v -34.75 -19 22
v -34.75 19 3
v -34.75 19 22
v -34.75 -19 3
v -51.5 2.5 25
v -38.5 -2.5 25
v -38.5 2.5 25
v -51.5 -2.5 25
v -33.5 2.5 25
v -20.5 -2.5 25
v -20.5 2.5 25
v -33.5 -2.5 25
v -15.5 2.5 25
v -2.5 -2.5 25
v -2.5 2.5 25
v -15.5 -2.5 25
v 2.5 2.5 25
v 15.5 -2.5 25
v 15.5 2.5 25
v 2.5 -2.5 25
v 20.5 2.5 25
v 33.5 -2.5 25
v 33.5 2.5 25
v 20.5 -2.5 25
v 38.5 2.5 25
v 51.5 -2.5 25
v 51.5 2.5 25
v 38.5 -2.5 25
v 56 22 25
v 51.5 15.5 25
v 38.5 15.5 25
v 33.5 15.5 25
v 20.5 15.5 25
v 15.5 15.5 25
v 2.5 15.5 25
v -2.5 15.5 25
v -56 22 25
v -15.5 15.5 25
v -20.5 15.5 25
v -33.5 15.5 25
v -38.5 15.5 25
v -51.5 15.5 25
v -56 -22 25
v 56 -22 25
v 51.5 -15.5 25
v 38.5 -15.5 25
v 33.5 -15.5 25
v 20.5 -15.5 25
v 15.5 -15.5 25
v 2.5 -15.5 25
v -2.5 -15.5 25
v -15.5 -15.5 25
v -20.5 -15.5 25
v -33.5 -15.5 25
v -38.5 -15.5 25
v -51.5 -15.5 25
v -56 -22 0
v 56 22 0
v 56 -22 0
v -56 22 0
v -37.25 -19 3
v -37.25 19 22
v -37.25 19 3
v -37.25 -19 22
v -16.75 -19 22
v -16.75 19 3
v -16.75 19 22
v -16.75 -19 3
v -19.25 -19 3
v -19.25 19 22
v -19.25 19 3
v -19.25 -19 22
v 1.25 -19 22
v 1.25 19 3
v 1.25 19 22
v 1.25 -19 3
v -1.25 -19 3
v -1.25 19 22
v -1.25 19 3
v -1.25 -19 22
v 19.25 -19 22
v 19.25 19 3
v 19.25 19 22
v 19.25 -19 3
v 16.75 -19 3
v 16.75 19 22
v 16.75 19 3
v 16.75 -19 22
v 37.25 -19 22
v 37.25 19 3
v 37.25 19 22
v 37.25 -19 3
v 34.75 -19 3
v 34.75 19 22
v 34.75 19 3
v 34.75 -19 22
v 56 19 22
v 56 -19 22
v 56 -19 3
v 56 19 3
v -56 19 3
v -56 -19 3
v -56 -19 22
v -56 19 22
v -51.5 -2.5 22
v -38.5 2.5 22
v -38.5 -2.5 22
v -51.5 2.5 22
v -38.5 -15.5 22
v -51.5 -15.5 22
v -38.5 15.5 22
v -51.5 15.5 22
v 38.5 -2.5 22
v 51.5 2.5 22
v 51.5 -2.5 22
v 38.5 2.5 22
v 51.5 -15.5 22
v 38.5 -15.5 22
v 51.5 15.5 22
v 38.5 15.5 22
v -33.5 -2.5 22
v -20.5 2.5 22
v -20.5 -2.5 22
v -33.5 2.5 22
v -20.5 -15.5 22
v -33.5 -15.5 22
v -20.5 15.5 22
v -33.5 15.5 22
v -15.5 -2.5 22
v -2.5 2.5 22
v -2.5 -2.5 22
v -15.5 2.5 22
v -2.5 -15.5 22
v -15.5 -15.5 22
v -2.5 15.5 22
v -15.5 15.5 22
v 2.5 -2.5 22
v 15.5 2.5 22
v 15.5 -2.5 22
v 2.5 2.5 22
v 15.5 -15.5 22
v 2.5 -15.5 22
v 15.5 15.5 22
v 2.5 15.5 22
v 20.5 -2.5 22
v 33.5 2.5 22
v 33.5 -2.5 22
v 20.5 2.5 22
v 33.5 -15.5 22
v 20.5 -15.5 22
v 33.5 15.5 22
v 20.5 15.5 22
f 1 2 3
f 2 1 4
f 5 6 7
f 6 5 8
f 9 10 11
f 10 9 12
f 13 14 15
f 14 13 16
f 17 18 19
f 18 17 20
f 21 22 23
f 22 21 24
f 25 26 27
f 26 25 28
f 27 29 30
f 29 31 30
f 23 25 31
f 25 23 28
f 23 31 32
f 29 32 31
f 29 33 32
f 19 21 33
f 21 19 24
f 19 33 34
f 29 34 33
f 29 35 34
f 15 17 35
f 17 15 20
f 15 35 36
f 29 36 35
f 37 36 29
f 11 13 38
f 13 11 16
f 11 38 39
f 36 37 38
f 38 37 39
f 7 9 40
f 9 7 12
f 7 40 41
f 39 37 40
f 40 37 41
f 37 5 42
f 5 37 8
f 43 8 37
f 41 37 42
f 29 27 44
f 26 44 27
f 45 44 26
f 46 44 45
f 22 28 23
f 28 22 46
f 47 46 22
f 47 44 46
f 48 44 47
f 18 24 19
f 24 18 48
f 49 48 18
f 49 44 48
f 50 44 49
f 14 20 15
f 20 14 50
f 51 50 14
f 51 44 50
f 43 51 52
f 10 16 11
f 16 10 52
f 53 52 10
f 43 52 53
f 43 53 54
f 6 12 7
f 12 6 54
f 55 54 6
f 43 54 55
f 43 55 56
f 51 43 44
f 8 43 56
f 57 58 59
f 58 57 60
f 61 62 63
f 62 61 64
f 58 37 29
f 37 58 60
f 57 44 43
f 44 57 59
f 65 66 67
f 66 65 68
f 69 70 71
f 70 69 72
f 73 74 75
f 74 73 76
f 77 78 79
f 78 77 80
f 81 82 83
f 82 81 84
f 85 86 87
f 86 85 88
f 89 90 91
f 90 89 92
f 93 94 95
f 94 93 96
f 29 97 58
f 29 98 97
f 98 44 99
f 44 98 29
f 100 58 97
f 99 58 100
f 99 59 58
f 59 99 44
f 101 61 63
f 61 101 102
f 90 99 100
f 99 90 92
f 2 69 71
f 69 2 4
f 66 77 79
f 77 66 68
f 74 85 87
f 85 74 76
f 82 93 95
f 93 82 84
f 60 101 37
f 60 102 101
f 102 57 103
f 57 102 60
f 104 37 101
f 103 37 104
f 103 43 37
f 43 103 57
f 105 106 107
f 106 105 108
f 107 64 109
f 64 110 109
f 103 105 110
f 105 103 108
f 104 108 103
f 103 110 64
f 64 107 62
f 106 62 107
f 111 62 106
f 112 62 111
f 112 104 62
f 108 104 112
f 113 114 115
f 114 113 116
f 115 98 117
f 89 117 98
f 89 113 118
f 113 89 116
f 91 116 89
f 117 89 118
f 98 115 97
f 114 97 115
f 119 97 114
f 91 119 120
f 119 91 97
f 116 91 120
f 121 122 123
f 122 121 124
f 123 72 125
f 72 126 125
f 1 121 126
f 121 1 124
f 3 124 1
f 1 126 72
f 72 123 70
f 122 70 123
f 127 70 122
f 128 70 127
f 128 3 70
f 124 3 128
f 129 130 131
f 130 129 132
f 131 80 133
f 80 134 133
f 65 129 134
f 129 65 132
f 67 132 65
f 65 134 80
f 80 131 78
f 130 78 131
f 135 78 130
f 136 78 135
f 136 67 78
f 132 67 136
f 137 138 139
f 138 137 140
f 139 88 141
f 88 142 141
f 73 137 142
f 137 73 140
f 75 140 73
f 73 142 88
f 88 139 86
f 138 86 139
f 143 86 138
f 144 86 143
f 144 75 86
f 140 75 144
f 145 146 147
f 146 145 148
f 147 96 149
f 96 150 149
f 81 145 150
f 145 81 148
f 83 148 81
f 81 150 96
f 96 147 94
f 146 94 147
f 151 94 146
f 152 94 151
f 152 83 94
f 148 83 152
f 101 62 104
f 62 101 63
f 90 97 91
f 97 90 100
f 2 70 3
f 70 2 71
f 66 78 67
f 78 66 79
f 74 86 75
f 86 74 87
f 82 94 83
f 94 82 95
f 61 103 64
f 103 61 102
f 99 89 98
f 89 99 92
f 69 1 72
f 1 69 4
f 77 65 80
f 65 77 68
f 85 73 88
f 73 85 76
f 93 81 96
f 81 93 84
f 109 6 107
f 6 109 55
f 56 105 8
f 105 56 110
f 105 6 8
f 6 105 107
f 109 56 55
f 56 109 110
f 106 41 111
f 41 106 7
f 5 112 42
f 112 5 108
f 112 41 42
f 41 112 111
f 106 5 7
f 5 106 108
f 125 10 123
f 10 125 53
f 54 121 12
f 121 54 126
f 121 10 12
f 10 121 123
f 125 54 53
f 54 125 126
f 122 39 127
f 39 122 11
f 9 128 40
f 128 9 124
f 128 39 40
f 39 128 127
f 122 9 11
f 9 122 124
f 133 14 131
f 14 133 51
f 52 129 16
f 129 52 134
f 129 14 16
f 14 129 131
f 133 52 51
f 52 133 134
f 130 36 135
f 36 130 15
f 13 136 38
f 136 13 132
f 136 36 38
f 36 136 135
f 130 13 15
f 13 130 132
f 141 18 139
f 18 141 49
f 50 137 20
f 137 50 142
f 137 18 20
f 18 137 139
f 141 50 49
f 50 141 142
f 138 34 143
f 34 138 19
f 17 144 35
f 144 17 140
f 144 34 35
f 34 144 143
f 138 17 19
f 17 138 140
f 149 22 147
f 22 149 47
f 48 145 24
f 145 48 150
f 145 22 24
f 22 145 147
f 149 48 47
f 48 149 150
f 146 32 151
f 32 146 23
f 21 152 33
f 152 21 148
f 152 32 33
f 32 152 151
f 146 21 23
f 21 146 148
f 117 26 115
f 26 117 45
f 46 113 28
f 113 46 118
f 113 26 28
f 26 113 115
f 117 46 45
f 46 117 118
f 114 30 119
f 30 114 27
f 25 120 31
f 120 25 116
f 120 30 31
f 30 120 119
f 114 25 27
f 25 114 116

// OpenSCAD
// Cuvette Rack - 12 slots (2 rows × 6 columns)
// Dimensions in millimeters

// Base and deck dimensions
base_x = 112;           // Base plate width (X)
base_y = 44;            // Base plate depth (Y)
base_z = 3;             // Base plate thickness
deck_z = 3;             // Deck plate thickness
deck_bottom_z = 22;     // Deck bottom position (z)
deck_top_z = 25;        // Deck top position (z)

// Wall dimensions
wall_height = 25;       // Height from bottom to top
end_wall_thick = 3;     // Thickness of end walls (Y direction)
rib_thick = 2.5;        // Thickness of ribs (X direction)

// Rib positions (X coordinates)
rib_x_positions = [-36, -18, 0, 18, 36];

// Hole dimensions and spacing
hole_size = 13;         // Square hole side length (mm)
hole_spacing_x = 18;    // X spacing between hole centers
hole_spacing_y = 18;    // Y spacing between hole centers

// Set resolution for shapes
$fn = 64;

difference() {
    // Positive geometry: base, deck, and walls
    union() {
        // Base plate (z = 0 to 3)
        translate([-base_x/2, -base_y/2, 0])
            cube([base_x, base_y, base_z]);
        
        // Deck plate (z = 22 to 25)
        translate([-base_x/2, -base_y/2, deck_bottom_z])
            cube([base_x, base_y, deck_z]);
        
        // Back end wall (at y = 22, 3 mm thick, extends to y = 19)
        translate([-base_x/2, base_y/2 - end_wall_thick, 0])
            cube([base_x, end_wall_thick, wall_height]);
        
        // Front end wall (at y = -22, 3 mm thick, extends to y = -19)
        translate([-base_x/2, -base_y/2, 0])
            cube([base_x, end_wall_thick, wall_height]);
        
        // Five vertical ribs (2.5 mm thick each)
        for (x = rib_x_positions) {
            translate([x - rib_thick/2, -base_y/2, 0])
                cube([rib_thick, base_y, wall_height]);
        }
    }
    
    // Negative geometry: holes in deck plate
    // 2 rows (Y) × 6 columns (X) of 13 × 13 mm square holes
    // 18 mm center-to-center spacing, centered on deck
    for (i = [0:5]) {
        for (j = [0:1]) {
            x = -45 + i * hole_spacing_x;    // X positions: -45, -27, -9, 9, 27, 45
            y = -9 + j * hole_spacing_y;     // Y positions: -9, 9
            // Cutting box extends beyond deck to ensure clean holes
            translate([x - hole_size/2, y - hole_size/2, deck_bottom_z - 0.5])
                cube([hole_size, hole_size, deck_top_z - deck_bottom_z + 1]);
        }
    }
}
